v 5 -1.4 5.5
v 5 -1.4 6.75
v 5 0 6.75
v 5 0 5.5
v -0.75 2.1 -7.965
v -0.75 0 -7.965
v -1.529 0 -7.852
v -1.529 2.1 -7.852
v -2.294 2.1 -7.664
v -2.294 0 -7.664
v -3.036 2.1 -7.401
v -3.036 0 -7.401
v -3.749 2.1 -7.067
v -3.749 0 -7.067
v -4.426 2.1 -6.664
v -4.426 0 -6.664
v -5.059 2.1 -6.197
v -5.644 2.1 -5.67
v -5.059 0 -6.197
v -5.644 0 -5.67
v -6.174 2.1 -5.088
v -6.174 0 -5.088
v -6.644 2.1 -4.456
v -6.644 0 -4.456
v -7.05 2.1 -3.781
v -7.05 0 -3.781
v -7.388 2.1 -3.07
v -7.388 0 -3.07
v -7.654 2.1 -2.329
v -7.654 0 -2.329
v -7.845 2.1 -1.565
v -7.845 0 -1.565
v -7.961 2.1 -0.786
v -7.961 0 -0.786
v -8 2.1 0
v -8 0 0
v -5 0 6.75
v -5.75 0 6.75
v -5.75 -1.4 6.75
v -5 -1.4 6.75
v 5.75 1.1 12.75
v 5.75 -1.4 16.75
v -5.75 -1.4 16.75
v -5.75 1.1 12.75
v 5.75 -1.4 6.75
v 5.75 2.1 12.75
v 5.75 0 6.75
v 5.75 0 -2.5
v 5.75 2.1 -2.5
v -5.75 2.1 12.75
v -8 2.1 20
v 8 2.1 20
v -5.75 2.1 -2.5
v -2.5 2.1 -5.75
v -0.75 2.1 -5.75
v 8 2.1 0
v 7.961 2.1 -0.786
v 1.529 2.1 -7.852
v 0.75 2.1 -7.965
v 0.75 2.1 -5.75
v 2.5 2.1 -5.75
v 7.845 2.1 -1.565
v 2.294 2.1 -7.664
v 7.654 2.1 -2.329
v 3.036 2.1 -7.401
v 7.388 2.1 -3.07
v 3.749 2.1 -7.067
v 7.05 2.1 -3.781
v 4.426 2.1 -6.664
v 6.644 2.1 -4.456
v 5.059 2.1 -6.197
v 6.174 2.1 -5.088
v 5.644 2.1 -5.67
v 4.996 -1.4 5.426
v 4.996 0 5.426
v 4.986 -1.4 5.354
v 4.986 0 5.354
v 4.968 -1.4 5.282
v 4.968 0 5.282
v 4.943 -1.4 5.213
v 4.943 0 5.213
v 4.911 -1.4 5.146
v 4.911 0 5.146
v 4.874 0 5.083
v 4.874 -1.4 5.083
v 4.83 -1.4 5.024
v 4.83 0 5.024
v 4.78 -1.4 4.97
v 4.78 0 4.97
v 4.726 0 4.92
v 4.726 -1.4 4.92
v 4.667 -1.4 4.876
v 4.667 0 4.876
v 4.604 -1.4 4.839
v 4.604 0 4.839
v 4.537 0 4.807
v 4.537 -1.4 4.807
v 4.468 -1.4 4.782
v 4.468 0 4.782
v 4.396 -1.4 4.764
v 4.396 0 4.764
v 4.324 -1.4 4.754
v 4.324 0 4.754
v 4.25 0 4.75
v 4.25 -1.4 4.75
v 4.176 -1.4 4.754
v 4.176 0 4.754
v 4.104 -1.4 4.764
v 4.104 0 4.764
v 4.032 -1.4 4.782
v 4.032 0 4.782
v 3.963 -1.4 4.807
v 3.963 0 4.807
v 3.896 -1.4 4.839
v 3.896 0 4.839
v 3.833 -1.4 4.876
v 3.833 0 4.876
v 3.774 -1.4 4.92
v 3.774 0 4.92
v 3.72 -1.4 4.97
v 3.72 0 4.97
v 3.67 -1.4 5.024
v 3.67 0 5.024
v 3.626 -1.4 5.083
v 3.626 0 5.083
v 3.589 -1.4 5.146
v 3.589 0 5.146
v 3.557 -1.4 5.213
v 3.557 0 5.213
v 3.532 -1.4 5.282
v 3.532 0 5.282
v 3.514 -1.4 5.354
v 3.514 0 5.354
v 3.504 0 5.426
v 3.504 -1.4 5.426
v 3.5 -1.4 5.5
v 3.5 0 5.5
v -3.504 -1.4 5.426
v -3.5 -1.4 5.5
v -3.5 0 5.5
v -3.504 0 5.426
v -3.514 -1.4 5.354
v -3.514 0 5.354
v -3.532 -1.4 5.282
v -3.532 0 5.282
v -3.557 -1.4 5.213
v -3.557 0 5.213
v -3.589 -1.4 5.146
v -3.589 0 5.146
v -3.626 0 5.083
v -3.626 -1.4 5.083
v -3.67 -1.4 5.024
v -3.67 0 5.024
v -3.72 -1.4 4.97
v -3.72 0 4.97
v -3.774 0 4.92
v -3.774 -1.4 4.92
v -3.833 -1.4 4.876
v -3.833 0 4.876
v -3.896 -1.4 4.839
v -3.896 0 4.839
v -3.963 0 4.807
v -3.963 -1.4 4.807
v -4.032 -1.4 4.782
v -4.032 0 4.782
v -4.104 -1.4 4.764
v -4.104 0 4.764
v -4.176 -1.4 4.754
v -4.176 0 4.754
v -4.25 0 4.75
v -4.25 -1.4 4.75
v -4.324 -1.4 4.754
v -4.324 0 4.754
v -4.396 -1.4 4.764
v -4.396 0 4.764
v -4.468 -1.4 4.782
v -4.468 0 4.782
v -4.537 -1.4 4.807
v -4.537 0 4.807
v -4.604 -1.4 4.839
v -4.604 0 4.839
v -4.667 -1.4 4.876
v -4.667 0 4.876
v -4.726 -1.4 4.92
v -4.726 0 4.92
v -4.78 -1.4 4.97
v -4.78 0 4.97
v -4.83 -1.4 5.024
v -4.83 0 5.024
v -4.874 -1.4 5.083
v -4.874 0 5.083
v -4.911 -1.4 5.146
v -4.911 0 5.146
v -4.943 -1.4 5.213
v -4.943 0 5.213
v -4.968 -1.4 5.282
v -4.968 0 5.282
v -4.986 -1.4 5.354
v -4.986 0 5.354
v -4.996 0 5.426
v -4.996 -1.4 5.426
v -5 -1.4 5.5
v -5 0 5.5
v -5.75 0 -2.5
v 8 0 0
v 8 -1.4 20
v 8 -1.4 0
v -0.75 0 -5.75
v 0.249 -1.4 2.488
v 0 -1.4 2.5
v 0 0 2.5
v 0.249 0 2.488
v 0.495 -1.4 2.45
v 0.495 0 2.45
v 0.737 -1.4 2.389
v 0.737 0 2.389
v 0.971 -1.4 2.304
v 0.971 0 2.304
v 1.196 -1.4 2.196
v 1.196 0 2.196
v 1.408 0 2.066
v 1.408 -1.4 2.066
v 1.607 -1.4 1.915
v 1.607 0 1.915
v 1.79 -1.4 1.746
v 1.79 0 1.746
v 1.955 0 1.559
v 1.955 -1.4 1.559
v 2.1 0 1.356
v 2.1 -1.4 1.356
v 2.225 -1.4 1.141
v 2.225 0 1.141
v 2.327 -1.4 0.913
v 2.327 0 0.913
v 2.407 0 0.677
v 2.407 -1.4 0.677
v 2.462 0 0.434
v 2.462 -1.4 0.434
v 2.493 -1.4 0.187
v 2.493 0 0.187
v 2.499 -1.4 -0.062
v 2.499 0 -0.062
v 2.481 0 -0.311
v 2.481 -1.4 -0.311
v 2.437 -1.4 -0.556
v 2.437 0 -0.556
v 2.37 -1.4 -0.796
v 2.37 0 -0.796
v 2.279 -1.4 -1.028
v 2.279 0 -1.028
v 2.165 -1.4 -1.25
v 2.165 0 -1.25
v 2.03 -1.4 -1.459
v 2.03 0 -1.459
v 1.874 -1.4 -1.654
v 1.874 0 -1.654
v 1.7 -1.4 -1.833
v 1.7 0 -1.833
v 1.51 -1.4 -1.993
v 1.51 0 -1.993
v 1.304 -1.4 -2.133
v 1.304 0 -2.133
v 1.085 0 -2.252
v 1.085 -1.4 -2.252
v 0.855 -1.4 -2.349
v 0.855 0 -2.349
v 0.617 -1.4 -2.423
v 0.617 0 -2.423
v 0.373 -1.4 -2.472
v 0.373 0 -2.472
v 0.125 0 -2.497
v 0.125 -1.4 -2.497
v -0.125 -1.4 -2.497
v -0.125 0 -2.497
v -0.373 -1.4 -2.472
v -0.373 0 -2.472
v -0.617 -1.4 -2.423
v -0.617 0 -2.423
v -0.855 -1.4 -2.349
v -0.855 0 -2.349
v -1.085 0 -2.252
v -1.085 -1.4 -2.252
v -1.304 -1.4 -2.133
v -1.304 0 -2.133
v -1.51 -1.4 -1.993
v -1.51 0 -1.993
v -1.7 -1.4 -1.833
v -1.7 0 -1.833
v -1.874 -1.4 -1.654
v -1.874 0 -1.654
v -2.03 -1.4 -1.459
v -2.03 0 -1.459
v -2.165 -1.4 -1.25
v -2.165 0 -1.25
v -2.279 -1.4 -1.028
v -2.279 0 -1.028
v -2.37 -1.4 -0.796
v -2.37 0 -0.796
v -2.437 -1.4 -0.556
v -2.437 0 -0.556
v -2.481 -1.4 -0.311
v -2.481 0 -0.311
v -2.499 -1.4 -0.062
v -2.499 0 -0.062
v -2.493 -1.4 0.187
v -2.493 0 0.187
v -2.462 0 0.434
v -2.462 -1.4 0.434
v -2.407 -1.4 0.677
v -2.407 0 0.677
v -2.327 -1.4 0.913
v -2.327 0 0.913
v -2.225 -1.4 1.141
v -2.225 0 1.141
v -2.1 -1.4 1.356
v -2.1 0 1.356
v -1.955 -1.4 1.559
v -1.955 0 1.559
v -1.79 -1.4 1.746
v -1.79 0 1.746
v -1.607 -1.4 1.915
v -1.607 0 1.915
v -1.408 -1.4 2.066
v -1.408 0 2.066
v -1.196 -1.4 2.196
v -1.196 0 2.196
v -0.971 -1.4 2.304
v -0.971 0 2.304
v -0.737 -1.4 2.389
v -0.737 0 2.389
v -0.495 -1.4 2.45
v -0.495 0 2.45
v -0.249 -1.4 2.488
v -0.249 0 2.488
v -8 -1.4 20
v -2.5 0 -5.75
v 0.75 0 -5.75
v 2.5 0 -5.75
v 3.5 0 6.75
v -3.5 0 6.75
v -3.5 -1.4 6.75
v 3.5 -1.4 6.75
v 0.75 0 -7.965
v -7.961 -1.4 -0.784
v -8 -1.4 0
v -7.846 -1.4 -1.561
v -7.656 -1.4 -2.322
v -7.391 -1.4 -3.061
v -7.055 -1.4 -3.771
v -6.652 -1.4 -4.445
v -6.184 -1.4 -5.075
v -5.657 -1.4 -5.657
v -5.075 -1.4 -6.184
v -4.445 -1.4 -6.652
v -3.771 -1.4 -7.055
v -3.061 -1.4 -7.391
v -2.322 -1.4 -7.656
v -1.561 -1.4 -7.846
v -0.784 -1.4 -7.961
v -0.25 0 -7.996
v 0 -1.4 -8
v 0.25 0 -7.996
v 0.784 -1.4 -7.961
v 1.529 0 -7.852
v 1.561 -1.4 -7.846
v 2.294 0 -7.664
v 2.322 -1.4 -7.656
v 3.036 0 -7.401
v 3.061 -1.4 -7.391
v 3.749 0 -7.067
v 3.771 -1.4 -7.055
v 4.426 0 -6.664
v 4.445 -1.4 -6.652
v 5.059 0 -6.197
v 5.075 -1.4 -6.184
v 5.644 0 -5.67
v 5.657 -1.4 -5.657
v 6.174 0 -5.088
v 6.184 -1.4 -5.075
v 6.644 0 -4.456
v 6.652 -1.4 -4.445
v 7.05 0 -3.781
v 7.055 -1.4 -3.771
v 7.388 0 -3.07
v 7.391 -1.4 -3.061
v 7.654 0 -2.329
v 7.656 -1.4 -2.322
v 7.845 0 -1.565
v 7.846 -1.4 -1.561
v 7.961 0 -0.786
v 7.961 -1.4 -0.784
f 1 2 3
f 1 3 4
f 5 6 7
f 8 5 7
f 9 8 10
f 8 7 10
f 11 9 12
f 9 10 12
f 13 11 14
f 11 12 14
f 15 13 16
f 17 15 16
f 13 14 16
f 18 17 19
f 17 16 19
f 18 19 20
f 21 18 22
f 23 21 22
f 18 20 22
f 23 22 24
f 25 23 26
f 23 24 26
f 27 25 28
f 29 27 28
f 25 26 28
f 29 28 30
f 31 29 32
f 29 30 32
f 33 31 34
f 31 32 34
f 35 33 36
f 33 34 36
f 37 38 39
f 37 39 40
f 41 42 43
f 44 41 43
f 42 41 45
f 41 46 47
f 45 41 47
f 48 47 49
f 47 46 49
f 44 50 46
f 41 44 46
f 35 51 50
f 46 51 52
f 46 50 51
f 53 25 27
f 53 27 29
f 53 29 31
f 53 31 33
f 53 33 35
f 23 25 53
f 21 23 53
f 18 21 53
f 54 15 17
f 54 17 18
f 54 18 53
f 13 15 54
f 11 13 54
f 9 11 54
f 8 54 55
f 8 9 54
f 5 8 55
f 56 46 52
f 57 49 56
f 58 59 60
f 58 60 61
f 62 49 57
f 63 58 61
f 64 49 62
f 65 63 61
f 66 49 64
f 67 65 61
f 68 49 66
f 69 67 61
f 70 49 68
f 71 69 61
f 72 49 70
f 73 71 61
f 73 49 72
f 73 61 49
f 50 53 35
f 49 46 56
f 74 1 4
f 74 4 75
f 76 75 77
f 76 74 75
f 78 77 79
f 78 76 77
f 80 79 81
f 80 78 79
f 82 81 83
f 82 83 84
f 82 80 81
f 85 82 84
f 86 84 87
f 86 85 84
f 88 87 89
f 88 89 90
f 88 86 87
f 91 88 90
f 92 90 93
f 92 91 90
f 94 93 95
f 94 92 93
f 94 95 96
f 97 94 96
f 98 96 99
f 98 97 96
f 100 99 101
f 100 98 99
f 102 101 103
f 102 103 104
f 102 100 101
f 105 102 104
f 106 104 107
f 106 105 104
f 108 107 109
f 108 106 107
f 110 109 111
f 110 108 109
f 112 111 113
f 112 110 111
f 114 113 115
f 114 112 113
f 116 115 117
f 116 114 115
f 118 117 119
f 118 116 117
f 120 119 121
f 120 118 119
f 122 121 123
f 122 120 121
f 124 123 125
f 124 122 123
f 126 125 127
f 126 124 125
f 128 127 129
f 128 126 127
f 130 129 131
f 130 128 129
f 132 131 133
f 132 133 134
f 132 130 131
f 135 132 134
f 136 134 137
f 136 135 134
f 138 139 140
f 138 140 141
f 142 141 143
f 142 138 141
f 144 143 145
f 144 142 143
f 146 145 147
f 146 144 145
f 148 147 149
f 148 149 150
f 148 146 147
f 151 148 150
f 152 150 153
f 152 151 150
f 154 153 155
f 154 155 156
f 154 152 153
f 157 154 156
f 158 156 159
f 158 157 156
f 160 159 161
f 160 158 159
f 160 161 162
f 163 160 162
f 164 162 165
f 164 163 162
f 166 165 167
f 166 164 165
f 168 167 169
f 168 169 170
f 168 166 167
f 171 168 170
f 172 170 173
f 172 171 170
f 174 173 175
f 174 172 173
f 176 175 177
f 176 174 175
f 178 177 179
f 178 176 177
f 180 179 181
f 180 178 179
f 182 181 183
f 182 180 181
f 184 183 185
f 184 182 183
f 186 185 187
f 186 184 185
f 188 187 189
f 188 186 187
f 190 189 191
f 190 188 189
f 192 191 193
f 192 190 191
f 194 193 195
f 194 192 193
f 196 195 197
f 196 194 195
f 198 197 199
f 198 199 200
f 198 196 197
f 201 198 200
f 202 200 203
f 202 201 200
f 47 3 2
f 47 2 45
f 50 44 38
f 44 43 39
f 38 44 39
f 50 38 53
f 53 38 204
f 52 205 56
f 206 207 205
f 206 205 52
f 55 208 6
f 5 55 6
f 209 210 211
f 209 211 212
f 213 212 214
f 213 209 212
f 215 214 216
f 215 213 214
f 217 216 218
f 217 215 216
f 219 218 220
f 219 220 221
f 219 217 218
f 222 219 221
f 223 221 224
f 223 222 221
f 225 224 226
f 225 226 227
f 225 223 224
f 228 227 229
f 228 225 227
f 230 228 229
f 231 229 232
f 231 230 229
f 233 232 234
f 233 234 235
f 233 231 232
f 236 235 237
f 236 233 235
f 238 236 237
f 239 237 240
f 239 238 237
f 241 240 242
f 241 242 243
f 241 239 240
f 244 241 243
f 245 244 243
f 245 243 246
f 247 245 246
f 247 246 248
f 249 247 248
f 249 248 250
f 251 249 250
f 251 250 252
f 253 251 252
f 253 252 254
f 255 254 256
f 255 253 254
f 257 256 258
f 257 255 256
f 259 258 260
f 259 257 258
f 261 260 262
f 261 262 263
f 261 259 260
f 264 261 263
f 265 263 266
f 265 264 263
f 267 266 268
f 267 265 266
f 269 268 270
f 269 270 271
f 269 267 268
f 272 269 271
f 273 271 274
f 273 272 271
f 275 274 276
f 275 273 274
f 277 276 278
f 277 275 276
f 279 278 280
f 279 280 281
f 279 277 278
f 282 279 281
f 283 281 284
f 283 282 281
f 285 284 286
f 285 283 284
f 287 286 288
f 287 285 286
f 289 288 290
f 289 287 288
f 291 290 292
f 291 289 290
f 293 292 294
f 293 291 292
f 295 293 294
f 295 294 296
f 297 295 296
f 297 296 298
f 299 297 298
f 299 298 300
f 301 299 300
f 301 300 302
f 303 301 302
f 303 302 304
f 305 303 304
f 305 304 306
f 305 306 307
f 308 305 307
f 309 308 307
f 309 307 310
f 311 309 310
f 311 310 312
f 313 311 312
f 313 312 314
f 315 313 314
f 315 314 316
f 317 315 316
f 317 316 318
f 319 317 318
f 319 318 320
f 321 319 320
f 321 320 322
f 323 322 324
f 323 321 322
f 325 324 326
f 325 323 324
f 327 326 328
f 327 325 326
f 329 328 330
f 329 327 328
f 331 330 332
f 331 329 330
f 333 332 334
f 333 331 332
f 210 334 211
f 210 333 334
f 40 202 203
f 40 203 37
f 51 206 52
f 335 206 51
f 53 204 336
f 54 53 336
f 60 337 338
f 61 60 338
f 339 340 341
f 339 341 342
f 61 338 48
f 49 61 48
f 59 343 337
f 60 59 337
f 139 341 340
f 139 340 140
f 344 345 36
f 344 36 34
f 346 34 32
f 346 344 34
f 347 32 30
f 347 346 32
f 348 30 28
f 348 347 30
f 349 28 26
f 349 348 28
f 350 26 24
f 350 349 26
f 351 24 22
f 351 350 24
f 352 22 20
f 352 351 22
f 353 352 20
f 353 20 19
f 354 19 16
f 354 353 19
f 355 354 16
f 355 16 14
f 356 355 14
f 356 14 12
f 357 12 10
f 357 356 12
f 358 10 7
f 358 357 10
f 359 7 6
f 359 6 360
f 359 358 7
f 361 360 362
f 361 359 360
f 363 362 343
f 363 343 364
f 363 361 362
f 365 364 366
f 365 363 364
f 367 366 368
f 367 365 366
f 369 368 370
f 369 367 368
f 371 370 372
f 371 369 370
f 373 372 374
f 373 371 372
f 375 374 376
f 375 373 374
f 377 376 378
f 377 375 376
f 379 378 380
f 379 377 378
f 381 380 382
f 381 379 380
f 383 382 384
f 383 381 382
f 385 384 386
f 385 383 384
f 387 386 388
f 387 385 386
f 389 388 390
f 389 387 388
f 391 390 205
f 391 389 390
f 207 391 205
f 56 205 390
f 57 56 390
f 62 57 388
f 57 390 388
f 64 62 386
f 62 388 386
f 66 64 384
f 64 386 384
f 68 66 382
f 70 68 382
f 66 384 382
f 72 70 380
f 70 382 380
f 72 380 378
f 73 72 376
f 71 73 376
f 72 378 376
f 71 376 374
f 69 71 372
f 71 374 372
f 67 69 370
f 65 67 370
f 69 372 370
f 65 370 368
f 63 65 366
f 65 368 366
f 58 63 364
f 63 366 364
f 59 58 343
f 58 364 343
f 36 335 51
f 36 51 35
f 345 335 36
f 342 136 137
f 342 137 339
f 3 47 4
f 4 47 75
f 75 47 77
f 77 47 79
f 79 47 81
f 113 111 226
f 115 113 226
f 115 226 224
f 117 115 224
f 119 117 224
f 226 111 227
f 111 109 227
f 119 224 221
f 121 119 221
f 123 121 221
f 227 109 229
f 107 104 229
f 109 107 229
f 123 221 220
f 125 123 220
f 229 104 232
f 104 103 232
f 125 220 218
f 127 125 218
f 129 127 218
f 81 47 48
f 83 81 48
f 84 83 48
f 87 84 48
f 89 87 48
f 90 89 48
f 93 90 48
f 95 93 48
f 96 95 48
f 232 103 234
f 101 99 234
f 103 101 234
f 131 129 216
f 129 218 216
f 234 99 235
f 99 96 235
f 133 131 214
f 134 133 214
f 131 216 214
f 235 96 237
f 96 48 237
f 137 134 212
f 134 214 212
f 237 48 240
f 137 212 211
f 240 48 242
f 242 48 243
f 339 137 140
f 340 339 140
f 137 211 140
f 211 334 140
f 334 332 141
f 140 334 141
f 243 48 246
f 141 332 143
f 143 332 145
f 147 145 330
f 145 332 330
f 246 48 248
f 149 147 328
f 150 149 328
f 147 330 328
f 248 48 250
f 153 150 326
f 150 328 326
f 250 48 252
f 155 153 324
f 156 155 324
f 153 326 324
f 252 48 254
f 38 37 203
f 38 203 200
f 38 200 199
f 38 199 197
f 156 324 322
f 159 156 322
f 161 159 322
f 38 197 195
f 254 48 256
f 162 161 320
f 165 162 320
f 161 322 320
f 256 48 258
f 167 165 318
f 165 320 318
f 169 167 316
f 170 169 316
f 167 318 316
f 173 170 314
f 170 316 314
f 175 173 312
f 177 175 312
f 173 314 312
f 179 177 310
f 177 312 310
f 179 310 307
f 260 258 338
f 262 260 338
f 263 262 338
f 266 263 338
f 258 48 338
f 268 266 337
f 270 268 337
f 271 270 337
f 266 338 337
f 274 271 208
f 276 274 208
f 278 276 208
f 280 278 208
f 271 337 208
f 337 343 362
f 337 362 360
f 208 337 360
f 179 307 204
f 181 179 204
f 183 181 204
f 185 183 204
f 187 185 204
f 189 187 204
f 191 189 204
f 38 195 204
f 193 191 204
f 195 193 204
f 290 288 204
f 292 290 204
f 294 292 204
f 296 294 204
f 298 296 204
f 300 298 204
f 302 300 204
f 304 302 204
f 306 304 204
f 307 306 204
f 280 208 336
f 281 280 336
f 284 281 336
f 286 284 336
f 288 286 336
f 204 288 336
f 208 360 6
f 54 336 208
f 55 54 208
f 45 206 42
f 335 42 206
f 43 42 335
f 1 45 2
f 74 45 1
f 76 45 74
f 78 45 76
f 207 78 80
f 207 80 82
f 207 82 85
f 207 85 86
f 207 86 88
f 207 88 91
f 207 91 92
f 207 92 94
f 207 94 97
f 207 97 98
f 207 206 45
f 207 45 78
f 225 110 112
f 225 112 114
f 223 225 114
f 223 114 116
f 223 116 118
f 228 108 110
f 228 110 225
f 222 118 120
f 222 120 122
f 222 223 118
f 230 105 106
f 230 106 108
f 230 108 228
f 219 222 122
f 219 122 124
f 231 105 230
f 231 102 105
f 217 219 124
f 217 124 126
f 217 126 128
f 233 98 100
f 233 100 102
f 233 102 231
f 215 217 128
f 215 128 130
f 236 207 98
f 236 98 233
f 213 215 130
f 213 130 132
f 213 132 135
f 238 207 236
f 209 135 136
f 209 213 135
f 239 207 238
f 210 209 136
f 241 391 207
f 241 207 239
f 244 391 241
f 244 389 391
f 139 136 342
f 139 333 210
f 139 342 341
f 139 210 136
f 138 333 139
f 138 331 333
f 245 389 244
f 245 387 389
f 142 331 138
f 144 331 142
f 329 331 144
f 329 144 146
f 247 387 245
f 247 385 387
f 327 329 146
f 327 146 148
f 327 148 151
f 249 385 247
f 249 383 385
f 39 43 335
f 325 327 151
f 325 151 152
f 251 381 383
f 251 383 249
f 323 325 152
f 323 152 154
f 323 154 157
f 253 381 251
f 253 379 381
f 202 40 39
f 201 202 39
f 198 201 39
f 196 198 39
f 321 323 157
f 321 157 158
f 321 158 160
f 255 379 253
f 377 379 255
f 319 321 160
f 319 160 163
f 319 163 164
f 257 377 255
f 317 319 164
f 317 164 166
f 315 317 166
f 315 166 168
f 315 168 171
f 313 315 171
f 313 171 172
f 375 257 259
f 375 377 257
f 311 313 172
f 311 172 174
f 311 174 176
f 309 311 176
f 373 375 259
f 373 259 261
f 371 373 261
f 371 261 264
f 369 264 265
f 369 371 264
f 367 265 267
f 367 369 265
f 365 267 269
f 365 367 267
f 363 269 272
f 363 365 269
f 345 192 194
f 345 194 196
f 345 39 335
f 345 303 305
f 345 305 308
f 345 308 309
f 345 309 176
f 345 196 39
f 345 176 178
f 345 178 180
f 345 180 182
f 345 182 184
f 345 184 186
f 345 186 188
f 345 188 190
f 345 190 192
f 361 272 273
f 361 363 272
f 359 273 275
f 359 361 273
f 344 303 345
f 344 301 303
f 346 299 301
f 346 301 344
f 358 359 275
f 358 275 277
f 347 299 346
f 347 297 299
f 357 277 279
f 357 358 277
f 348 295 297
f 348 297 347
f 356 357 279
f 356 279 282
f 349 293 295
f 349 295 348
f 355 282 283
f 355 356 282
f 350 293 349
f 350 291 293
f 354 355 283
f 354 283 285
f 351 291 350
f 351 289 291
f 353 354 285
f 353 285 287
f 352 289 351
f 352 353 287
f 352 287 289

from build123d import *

# Parameters (mm, degrees)
BOSS_EXTRUDE1_DEPTH = 2.1
BOSS_EXTRUDE2_START = -1.4
SKETCH2_R           = 2.5
BOSS_EXTRUDE2_DEPTH = 1.4
SKETCH3_W           = 11.5
SKETCH3_H           = 6
CUT_EXTRUDE1_DEPTH  = 22.823152843
CHAMFER1_SIZE       = 2.5
CHAMFER1_SIZE2      = 4


with BuildPart() as part:
    # Sketch1 → Boss-Extrude1 (new body)
    with BuildSketch(Plane(origin=(0, 0, 0), x_dir=(1, 0, 0), z_dir=(0, 1, 0))):
        with BuildLine():
            Line((-5.75, 2.5), (-2.5, 5.75))
            Line((-2.5, 5.75), (-0.75, 5.75))
            Line((-0.75, 5.75), (-0.75, 7.964766161))
            ThreePointArc((-0.75, 7.964766161), (-5.916079783, 5.385164807), (-8, 0))
            Line((-8, 0), (-8, -20))
            Line((-8, -20), (8, -20))
            Line((8, -20), (8, 0))
            ThreePointArc((8, 0), (5.916079783, 5.385164807), (0.75, 7.964766161))
            Line((0.75, 7.964766161), (0.75, 5.75))
            Line((0.75, 5.75), (2.5, 5.75))
            Line((2.5, 5.75), (5.75, 2.5))
            Line((5.75, 2.5), (5.75, -6.75))
            Line((5.75, -6.75), (-5.75, -6.75))
            Line((-5.75, -6.75), (-5.75, 2.5))
        make_face()
    extrude(amount=BOSS_EXTRUDE1_DEPTH)

    # Sketch2 → Boss-Extrude2 (add)
    with BuildSketch(Plane(origin=(0, 0, 0), x_dir=(1, 0, 0), z_dir=(0, 1, 0)).offset(BOSS_EXTRUDE2_START)):
        with BuildLine():
            Line((8, 0), (8, -20))
            Line((8, -20), (-8, -20))
            Line((-8, -20), (-8, 0))
            ThreePointArc((-8, 0), (0, 8), (8, 0))
        make_face()
        with Locations(Location((0, 0, 0), (0, 0, 270))):
            Circle(SKETCH2_R, mode=Mode.SUBTRACT)
        with BuildLine():
            Line((-5, -5.5), (-5, -6.75))
            Line((-5, -6.75), (-3.5, -6.75))
            Line((-3.5, -6.75), (-3.5, -5.5))
            ThreePointArc((-3.5, -5.5), (-4.25, -4.75), (-5, -5.5))
        make_face(mode=Mode.SUBTRACT)
        with BuildLine():
            Line((3.5, -5.5), (3.5, -6.75))
            Line((3.5, -6.75), (5, -6.75))
            Line((5, -6.75), (5, -5.5))
            ThreePointArc((5, -5.5), (4.25, -4.75), (3.5, -5.5))
        make_face(mode=Mode.SUBTRACT)
    extrude(amount=BOSS_EXTRUDE2_DEPTH)

    # Sketch3 → Cut-Extrude1 (cut, through all)
    with BuildSketch(Plane(origin=(0, 2.1, 0), x_dir=(1, 0, 0), z_dir=(0, 1, 0))):
        with Locations((0, -9.75)):
            Rectangle(SKETCH3_W, SKETCH3_H)
    extrude(amount=-CUT_EXTRUDE1_DEPTH, mode=Mode.SUBTRACT)

    # Chamfer1
    chamfer1_edges = [part.edges().sort_by_distance(p)[0] for p in [
        (0, -1.4, 12.75),
    ]]
    chamfer1_side = [part.faces().sort_by_distance(p)[0] for p in [
        (0, 0.35, 12.75),
    ]]
    chamfer(chamfer1_edges, length=CHAMFER1_SIZE, length2=CHAMFER1_SIZE2, reference=chamfer1_side[0])


solid = part.part
